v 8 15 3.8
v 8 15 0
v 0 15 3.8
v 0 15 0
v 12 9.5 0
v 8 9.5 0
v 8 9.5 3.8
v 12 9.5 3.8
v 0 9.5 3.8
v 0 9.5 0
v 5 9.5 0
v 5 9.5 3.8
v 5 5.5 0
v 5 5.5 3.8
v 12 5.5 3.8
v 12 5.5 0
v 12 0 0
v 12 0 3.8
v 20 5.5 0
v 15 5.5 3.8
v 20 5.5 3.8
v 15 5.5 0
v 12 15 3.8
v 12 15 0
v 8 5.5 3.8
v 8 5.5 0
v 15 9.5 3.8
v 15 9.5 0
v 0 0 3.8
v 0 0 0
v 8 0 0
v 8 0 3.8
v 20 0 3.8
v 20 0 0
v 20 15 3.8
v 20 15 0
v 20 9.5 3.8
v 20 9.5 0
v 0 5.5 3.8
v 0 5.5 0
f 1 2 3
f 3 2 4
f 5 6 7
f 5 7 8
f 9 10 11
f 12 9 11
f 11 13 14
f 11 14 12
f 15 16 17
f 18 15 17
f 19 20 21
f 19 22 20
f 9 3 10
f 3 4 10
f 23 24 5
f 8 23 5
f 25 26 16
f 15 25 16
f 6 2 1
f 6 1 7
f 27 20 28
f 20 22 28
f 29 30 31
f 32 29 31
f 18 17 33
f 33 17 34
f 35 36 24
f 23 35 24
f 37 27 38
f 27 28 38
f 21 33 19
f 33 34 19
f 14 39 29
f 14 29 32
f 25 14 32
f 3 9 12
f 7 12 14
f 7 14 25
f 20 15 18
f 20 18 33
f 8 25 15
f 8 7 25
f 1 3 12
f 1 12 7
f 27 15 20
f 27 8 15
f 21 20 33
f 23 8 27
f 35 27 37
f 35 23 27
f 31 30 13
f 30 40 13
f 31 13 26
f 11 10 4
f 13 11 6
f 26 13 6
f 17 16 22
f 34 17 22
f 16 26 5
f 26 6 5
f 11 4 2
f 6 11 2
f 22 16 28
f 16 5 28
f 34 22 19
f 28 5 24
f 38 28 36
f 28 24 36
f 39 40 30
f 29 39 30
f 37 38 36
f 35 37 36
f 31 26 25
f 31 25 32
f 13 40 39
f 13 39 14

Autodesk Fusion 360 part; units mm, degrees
sketch "Sketch1" plane through (0, 0, 0) normal (0, 0, 1) x (1, 0, 0)
  line L0 (0, 0) -> (20, 0)
  line L1 (20, 0) -> (20, 15)
  line L2 (20, 15) -> (0, 15)
  line L3 (0, 15) -> (0, 0)
  line L4 (15, 0) -> (15, 15)
  line L5 (5, 0) -> (5, 15)
  line L6 (0, 7.5) -> (20, 7.5) construction
  line L7 (0, 5.5) -> (20, 5.5)
  line L8 (0, 9.5) -> (20, 9.5)
  line L9 (10, 15) -> (10, 0) construction
  line L10 (8, 15) -> (8, 0)
  line L11 (12, 15) -> (12, 0)
  dimension "d1" = 2
  dimension "d2" = 2
extrude "Extrude1" add sketch "Sketch1" along normal blind 3.8 contours L0 L3 L5 L7 | L0 L5 L7 L10 | L5 L7 L8 L10 | L2 L3 L5 L8 | L0 L4 L7 L11 | L7 L8 L10 L11 | L2 L5 L8 L10 | L0 L1 L4 L7 | L4 L7 L8 L11 | L2 L4 L8 L11 | L1 L2 L4 L8
sketch "Sketch2" plane through (0, 0, 3.8) normal (0, 0, 1) x (-1, 0, 0)
  line L0 (-15, -5.5) -> (-15, -9.5)
  line L1 (-15, -9.5) -> (-20, -9.5)
  line L2 (-20, -9.5) -> (-20, -15)
  line L3 (-20, -15) -> (-12, -15)
  line L4 (-12, -15) -> (-12, -9.5)
  line L5 (-12, -9.5) -> (-8, -9.5)
  line L6 (-8, -9.5) -> (-8, -15)
  line L7 (-8, -15) -> (0, -15)
  line L8 (0, -15) -> (0, -9.5)
  line L9 (0, -9.5) -> (-5, -9.5)
  line L10 (-5, -9.5) -> (-5, -5.5)
  line L11 (-5, -5.5) -> (0, -5.5)
  line L12 (0, -5.5) -> (0, 0)
  line L13 (0, 0) -> (-8, 0)
  line L14 (-8, 0) -> (-8, -5.5)
  line L15 (-8, -5.5) -> (-12, -5.5)
  line L16 (-12, -5.5) -> (-12, 0)
  line L17 (-12, 0) -> (-20, 0)
  line L18 (-20, 0) -> (-20, -5.5)
  line L19 (-20, -5.5) -> (-15, -5.5)
